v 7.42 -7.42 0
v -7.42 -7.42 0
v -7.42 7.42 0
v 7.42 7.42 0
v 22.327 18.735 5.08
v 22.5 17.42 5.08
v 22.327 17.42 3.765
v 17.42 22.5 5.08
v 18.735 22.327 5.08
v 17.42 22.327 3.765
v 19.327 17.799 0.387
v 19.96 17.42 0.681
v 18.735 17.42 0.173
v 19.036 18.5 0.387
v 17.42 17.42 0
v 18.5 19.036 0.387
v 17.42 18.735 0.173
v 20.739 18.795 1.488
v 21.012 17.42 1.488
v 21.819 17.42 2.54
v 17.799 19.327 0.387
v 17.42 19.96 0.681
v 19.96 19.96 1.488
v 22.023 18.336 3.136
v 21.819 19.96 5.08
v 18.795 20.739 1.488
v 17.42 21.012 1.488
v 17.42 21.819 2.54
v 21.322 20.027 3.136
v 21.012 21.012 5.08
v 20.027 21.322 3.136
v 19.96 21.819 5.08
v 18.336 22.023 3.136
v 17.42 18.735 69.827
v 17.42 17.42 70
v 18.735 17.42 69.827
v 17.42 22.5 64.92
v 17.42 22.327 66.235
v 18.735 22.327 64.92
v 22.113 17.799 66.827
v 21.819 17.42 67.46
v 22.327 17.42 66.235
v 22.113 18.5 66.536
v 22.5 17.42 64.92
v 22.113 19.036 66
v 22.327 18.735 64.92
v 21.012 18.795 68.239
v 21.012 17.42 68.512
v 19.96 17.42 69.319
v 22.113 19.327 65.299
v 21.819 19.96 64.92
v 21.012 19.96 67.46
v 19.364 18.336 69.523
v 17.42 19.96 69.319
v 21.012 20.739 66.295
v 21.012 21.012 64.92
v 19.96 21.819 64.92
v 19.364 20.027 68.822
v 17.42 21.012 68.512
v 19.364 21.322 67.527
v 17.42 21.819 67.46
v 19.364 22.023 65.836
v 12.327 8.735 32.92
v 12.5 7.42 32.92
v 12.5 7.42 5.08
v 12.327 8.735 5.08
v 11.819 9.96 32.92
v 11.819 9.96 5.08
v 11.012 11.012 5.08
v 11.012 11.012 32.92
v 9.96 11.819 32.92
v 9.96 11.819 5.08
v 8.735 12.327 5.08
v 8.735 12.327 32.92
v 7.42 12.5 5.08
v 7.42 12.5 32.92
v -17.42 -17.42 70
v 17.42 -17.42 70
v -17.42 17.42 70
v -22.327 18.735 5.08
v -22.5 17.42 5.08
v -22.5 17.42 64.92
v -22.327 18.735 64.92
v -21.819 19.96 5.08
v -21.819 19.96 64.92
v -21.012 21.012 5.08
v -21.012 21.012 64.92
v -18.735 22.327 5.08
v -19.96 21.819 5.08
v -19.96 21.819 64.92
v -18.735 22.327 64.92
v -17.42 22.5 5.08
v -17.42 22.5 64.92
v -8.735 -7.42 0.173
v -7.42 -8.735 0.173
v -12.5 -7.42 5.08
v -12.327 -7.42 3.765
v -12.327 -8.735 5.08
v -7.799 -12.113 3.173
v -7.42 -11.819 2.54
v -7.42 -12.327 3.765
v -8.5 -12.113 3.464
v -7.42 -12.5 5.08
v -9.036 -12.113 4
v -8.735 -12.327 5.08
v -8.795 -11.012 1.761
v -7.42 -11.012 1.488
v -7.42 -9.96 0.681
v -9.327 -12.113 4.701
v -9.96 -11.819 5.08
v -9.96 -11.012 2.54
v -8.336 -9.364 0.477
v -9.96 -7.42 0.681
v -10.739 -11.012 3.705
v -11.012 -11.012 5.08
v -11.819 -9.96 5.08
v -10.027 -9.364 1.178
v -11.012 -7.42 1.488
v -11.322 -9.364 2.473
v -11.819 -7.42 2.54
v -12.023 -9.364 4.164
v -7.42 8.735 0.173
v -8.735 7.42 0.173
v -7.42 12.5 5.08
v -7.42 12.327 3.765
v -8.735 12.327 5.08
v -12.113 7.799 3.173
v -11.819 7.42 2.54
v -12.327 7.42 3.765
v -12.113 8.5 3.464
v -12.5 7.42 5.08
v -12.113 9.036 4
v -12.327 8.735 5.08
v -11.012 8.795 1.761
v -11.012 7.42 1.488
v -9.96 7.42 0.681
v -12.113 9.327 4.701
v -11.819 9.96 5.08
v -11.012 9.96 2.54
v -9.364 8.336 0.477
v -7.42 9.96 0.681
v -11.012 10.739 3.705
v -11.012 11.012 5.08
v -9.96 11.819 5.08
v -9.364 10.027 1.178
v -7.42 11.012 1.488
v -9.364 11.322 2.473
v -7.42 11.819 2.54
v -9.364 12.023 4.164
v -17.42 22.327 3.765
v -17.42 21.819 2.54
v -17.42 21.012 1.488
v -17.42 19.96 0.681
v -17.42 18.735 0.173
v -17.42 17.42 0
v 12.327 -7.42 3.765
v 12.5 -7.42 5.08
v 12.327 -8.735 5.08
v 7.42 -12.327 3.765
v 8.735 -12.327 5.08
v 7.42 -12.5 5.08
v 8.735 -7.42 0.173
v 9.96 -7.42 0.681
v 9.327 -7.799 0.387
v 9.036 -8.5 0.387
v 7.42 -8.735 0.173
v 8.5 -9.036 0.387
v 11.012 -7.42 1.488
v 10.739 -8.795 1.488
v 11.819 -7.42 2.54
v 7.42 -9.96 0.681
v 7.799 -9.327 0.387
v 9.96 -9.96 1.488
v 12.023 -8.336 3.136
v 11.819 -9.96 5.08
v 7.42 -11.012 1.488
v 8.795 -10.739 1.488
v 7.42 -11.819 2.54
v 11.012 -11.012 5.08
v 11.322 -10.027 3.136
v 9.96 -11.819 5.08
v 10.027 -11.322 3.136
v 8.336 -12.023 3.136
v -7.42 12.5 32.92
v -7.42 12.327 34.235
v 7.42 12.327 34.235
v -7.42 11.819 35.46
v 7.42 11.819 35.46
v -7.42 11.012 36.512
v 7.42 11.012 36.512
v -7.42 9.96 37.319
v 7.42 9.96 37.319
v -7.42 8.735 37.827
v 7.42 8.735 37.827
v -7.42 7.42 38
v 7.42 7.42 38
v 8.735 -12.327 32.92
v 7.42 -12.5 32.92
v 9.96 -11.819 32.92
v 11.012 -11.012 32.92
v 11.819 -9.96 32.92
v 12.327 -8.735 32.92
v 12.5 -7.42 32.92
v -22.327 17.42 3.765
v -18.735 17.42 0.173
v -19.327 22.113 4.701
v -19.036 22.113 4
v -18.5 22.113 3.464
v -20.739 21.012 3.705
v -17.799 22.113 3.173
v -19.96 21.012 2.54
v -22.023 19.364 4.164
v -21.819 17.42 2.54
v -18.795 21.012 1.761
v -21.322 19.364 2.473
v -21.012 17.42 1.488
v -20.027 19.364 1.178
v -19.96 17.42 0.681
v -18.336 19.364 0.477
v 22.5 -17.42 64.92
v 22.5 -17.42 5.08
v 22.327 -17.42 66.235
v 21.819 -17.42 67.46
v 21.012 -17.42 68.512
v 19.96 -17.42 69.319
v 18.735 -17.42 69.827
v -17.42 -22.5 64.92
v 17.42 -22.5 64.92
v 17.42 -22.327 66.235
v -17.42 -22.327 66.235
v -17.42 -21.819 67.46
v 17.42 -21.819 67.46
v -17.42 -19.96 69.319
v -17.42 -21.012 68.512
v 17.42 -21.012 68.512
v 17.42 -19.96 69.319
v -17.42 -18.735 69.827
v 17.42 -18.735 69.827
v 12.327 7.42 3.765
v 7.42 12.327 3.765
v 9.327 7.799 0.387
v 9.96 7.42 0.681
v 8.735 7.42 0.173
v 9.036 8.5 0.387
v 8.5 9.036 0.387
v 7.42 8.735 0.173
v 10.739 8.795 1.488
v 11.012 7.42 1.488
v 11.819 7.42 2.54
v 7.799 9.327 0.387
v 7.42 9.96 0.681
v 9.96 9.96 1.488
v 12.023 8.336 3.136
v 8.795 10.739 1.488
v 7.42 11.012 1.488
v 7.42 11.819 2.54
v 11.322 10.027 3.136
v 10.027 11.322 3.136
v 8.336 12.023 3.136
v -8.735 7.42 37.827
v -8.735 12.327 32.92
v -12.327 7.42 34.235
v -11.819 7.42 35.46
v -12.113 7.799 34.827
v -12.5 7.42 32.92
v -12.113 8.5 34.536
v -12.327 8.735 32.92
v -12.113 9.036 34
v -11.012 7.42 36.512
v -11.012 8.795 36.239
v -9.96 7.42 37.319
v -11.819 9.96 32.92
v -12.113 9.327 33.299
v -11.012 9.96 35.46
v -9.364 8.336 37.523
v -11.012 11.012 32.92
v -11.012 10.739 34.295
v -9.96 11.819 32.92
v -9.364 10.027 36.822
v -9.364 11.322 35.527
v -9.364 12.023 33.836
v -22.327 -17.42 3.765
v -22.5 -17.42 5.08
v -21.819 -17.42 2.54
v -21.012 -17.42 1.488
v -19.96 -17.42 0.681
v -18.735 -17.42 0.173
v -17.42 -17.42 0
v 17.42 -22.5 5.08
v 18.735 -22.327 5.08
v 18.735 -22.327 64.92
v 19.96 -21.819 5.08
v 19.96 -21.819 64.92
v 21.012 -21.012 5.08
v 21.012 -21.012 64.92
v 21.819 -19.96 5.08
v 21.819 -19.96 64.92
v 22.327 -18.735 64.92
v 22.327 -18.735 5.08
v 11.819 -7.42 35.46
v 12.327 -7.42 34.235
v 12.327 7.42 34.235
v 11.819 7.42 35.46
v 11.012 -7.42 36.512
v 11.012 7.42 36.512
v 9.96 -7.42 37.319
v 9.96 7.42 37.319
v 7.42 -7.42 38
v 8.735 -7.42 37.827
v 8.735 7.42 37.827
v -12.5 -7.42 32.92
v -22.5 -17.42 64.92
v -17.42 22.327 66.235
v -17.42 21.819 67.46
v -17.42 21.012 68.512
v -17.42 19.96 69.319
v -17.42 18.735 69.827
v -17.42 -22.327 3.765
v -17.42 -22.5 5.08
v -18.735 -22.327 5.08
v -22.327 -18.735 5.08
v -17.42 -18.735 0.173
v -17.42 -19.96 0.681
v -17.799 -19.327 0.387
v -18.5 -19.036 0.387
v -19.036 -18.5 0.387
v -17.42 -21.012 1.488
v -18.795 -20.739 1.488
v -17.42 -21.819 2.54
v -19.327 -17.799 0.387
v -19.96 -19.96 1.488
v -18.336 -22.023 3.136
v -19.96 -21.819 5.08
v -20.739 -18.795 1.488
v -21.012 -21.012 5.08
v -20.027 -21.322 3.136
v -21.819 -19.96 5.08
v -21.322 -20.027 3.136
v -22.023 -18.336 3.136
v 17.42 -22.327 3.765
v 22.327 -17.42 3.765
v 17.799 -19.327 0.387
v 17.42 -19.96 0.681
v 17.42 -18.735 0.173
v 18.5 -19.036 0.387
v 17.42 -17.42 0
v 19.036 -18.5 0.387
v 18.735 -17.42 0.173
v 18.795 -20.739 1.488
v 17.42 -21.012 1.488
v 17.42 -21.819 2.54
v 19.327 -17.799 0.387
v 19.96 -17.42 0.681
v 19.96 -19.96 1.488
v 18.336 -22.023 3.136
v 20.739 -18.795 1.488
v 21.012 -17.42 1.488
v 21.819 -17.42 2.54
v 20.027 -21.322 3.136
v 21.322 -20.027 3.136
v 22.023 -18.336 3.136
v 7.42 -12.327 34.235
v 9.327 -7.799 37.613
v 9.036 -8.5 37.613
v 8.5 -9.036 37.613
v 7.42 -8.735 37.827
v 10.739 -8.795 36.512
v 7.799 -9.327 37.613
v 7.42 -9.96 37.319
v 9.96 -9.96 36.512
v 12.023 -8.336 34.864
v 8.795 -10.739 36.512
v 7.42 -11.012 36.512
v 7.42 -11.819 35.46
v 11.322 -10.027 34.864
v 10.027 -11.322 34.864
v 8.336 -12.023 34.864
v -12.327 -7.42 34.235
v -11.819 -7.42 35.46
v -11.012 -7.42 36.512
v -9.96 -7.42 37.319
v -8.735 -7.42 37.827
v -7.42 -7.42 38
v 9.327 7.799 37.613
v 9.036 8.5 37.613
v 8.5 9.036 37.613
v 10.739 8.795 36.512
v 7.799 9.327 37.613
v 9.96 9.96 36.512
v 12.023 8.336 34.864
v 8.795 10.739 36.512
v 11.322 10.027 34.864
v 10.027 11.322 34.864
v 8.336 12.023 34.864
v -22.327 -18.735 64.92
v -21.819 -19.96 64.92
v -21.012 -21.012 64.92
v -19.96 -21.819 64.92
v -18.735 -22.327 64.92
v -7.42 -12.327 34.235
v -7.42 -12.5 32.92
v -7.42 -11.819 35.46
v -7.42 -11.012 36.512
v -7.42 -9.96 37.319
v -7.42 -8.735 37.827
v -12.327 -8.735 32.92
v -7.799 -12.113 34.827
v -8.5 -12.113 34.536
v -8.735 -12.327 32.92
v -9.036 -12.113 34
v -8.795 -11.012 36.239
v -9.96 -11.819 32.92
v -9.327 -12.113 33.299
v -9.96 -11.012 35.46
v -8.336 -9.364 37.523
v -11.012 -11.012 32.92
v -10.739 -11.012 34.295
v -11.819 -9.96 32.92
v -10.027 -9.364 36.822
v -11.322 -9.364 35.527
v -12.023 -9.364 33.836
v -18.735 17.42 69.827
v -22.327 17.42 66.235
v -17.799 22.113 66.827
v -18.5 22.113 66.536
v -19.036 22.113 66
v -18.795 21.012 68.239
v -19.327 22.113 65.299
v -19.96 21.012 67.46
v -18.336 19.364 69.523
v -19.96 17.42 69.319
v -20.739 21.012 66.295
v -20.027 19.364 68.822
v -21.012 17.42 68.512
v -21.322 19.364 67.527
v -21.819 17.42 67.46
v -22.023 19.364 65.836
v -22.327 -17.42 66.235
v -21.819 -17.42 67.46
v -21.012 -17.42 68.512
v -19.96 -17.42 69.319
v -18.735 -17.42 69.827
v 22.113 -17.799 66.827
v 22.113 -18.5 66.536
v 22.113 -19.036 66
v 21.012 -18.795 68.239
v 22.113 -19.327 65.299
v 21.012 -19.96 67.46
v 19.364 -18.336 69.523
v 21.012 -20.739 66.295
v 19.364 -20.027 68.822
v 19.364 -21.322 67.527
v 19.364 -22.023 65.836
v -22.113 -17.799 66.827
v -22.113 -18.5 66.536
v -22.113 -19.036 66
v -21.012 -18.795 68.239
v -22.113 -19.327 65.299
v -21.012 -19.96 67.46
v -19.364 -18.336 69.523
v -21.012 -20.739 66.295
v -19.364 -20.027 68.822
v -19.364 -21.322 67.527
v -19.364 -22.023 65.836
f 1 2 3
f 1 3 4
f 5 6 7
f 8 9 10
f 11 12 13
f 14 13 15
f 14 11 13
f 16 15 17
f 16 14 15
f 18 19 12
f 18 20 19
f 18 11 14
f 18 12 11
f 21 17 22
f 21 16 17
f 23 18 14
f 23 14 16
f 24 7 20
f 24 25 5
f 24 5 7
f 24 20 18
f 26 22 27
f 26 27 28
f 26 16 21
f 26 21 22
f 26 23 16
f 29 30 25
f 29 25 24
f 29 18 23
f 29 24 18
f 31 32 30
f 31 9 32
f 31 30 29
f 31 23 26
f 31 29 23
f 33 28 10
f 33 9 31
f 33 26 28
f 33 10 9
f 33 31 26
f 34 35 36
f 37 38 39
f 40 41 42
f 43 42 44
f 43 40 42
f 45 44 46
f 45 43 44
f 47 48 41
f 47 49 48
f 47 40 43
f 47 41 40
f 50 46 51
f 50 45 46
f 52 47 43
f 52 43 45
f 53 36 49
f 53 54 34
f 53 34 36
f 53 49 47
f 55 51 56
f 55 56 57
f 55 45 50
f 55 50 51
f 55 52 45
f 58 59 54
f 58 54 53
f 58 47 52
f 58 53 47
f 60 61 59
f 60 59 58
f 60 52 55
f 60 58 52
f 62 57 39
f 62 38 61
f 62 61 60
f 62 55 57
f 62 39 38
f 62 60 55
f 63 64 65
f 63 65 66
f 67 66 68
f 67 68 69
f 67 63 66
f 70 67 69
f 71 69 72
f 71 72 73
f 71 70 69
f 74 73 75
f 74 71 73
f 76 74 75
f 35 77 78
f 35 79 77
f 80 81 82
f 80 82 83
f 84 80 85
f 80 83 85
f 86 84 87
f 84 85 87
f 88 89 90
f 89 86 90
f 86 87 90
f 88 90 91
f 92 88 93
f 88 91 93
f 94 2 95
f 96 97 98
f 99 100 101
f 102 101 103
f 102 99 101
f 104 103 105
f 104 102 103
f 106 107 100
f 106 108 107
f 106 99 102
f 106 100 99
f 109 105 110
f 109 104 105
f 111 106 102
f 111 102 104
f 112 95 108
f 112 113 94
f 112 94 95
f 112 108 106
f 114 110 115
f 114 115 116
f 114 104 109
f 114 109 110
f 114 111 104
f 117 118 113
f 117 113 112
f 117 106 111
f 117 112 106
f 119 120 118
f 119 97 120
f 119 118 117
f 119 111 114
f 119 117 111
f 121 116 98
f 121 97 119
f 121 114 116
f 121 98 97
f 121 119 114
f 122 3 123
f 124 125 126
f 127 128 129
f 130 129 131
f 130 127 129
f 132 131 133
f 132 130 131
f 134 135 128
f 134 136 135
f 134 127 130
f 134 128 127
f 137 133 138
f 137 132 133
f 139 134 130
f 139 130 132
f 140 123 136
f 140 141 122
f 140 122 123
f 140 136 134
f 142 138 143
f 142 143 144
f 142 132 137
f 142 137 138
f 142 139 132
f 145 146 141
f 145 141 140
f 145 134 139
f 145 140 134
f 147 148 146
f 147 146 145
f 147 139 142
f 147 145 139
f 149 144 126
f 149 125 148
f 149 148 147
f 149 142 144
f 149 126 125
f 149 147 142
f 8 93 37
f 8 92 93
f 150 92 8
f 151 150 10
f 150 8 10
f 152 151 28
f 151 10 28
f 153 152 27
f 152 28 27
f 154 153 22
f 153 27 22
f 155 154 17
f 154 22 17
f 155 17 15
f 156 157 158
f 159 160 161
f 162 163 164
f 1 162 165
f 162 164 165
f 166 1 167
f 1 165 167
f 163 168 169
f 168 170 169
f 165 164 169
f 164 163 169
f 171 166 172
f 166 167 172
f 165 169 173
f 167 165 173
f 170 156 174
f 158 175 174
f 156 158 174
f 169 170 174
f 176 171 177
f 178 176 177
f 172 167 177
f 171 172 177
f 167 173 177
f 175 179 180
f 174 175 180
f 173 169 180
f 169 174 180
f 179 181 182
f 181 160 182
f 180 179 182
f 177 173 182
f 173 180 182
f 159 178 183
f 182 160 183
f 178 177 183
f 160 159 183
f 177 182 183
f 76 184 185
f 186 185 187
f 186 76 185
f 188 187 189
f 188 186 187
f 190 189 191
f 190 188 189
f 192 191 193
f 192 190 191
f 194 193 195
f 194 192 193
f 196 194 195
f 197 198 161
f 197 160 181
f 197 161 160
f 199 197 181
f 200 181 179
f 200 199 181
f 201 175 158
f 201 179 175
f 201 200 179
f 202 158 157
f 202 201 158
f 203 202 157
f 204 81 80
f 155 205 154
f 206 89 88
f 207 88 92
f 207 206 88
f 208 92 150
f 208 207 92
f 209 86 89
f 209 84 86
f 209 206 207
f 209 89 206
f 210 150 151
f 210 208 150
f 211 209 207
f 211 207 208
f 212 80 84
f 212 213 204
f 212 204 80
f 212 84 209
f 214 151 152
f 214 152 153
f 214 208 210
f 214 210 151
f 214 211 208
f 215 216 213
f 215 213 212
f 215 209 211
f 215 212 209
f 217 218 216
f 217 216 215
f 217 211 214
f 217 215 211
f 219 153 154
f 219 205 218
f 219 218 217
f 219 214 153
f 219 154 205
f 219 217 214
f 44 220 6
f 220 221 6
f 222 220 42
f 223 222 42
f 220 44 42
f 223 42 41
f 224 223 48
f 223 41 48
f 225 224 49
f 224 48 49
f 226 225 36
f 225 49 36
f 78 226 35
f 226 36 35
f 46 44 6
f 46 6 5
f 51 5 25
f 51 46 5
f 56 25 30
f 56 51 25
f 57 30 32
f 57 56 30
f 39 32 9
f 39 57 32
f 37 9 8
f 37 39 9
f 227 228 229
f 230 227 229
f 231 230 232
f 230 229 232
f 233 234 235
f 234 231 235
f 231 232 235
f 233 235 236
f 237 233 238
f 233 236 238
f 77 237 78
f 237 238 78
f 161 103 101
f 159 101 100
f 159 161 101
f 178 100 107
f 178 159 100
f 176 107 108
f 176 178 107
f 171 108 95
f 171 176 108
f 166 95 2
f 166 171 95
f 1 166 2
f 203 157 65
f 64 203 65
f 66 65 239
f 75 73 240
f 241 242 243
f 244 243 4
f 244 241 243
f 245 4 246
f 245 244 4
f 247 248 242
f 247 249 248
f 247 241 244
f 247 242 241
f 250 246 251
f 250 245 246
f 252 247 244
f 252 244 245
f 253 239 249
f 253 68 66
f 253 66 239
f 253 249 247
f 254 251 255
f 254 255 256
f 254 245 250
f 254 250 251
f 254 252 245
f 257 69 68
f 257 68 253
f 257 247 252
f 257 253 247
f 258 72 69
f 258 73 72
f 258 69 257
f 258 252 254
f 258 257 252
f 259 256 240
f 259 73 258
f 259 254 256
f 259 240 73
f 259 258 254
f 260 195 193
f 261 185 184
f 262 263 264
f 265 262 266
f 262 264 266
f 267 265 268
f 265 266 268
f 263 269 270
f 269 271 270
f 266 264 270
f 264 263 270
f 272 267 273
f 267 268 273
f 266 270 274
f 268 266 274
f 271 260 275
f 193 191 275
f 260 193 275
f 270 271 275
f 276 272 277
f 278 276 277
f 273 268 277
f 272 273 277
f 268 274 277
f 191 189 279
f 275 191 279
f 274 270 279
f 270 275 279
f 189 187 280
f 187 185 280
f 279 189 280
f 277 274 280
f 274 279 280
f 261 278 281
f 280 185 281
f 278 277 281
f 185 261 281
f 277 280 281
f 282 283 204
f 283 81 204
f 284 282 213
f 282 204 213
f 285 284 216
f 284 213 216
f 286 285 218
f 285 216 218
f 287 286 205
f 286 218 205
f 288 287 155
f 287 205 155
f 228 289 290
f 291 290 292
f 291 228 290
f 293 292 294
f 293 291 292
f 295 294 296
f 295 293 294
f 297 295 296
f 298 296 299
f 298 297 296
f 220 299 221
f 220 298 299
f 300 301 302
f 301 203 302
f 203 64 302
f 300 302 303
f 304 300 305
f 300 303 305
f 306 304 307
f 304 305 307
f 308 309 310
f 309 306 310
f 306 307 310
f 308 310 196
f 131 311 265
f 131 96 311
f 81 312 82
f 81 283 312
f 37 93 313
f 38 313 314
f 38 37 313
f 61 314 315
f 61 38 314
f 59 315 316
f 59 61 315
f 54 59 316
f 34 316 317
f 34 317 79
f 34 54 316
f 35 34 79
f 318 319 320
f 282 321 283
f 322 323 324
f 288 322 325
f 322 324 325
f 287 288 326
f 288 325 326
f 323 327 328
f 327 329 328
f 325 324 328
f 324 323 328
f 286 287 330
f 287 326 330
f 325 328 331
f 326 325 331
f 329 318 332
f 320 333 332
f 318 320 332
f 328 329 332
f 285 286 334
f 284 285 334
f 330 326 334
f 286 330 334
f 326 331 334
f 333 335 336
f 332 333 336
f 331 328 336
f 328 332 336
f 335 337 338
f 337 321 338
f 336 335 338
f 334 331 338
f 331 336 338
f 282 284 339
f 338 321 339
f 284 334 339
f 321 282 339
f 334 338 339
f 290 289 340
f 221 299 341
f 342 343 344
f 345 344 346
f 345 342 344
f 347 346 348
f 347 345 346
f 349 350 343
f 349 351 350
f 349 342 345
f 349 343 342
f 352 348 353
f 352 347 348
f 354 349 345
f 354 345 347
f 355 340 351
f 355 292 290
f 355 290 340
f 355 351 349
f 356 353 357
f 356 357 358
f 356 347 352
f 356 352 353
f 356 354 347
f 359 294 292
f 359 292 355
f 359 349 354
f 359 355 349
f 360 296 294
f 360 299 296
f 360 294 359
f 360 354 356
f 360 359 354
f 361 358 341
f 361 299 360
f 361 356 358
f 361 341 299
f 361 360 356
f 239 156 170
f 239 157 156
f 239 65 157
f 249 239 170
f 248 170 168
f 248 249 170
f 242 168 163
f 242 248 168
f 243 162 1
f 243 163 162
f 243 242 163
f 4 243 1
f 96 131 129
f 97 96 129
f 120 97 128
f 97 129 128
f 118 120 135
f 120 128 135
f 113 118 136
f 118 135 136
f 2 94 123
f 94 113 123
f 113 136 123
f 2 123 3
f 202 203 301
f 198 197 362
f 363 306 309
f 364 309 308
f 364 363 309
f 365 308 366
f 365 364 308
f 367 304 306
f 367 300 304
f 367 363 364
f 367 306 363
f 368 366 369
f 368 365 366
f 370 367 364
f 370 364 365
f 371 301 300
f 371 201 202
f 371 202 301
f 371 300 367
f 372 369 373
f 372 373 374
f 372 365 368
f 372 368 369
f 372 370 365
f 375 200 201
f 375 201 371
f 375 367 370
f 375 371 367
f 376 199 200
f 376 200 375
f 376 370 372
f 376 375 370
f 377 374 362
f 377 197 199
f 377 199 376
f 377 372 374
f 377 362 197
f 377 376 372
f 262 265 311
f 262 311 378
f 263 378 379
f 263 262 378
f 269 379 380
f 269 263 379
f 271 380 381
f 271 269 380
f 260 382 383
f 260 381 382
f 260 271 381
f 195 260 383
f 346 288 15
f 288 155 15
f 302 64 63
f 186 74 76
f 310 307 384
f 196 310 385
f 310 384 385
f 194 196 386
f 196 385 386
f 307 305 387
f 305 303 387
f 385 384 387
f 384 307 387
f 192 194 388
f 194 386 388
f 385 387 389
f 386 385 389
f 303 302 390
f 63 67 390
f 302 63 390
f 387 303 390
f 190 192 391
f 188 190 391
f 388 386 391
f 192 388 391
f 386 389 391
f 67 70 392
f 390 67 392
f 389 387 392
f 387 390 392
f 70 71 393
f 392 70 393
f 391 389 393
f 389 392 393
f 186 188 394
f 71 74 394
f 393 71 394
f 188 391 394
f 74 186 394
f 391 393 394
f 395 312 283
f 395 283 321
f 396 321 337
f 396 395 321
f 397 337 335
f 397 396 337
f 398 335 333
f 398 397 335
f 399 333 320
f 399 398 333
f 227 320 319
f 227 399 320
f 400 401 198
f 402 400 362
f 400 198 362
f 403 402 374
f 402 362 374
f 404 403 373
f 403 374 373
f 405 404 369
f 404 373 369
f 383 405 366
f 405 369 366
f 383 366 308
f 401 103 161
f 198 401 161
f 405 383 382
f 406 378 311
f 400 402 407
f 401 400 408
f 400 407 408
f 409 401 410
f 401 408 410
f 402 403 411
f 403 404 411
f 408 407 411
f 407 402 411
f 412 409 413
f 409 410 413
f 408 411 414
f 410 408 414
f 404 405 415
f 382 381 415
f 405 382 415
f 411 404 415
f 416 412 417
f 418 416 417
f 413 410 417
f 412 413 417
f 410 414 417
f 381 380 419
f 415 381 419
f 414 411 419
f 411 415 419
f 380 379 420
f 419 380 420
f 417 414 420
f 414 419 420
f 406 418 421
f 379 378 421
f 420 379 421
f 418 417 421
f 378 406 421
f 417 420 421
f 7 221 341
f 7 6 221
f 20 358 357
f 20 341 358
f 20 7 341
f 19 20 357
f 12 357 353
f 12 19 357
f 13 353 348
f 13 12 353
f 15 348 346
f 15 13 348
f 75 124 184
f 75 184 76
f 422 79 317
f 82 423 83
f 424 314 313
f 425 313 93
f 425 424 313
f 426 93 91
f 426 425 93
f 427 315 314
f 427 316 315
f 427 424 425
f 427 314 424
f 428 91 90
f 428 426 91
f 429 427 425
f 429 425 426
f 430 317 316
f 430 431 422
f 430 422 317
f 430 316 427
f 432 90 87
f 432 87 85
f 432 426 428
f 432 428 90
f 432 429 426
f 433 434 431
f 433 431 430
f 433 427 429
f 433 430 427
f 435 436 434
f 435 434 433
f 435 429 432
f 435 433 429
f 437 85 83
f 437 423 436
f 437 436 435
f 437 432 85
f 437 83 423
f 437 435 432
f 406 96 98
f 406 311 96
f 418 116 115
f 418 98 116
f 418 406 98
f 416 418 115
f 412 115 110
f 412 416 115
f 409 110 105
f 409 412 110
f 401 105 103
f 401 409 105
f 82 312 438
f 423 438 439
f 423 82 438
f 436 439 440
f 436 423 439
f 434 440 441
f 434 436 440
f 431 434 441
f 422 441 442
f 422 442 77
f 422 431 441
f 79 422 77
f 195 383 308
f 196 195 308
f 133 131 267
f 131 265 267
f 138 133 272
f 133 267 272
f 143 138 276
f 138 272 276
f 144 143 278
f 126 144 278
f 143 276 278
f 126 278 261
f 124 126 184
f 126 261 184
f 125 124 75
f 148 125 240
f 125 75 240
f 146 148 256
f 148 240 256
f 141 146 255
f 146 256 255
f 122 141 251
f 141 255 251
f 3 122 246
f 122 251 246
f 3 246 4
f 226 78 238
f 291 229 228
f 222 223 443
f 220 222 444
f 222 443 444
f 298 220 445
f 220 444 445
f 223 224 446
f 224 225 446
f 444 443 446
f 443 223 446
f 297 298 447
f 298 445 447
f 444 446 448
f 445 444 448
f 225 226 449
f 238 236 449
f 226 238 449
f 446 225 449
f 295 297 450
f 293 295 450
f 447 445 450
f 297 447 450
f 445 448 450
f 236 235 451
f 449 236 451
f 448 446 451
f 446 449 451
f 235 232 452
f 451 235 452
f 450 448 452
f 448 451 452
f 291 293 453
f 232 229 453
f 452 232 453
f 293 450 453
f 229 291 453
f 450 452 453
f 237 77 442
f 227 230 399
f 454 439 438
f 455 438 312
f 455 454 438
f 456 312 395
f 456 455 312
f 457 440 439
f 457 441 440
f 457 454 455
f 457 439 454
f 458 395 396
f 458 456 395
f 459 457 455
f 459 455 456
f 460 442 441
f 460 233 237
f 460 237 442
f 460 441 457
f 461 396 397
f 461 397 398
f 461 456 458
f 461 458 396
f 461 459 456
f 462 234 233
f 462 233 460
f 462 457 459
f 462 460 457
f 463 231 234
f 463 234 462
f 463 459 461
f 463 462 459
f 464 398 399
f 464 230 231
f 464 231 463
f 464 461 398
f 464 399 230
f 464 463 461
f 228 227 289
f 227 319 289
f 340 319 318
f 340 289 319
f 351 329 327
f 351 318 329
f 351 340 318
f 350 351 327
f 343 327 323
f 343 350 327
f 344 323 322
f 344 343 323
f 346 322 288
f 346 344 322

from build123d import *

# Parameters (mm, degrees)
F0_W     = 45
F0_H     = 45
F1_DEPTH = 70
F2_R     = 5.08
F3_W     = 25
F3_H     = 25
F4_DEPTH = 38
F5_R     = 5.08


with BuildPart() as f1:
    # F0 (on Top) → F1 (new body)
    with BuildSketch(Plane.XY):
        Rectangle(F0_W, F0_H)
    extrude(amount=F1_DEPTH)

    # F2
    f2_edges = [f1.edges().sort_by_distance(p)[0] for p in [
        (0, -22.5, 70),
        (-22.5, 0, 70),
        (0, 22.5, 70),
        (22.5, 0, 70),
        (22.5, -22.5, 35),
        (22.5, 22.5, 35),
        (-22.5, -22.5, 35),
        (0, -22.5, 0),
        (22.5, 0, 0),
        (-22.5, 0, 0),
        (-22.5, 22.5, 35),
        (0, 22.5, 0),
    ]]
    fillet(f2_edges, radius=F2_R)


with BuildPart() as f4:
    # F3 (on Top) → F4 (new body)
    with BuildSketch(Plane.XY):
        Rectangle(F3_W, F3_H)
    extrude(amount=F4_DEPTH)

    # F5
    f5_edges = [f4.edges().sort_by_distance(p)[0] for p in [
        (12.5, -12.5, 19),
        (12.5, 12.5, 19),
        (12.5, 0, 0),
        (12.5, 0, 38),
        (0, 12.5, 0),
        (0, 12.5, 38),
        (-12.5, 0, 38),
        (0, -12.5, 38),
        (-12.5, 0, 0),
        (0, -12.5, 0),
        (-12.5, 12.5, 19),
        (-12.5, -12.5, 19),
    ]]
    fillet(f5_edges, radius=F5_R)


solid = Compound([f1.part, f4.part])
